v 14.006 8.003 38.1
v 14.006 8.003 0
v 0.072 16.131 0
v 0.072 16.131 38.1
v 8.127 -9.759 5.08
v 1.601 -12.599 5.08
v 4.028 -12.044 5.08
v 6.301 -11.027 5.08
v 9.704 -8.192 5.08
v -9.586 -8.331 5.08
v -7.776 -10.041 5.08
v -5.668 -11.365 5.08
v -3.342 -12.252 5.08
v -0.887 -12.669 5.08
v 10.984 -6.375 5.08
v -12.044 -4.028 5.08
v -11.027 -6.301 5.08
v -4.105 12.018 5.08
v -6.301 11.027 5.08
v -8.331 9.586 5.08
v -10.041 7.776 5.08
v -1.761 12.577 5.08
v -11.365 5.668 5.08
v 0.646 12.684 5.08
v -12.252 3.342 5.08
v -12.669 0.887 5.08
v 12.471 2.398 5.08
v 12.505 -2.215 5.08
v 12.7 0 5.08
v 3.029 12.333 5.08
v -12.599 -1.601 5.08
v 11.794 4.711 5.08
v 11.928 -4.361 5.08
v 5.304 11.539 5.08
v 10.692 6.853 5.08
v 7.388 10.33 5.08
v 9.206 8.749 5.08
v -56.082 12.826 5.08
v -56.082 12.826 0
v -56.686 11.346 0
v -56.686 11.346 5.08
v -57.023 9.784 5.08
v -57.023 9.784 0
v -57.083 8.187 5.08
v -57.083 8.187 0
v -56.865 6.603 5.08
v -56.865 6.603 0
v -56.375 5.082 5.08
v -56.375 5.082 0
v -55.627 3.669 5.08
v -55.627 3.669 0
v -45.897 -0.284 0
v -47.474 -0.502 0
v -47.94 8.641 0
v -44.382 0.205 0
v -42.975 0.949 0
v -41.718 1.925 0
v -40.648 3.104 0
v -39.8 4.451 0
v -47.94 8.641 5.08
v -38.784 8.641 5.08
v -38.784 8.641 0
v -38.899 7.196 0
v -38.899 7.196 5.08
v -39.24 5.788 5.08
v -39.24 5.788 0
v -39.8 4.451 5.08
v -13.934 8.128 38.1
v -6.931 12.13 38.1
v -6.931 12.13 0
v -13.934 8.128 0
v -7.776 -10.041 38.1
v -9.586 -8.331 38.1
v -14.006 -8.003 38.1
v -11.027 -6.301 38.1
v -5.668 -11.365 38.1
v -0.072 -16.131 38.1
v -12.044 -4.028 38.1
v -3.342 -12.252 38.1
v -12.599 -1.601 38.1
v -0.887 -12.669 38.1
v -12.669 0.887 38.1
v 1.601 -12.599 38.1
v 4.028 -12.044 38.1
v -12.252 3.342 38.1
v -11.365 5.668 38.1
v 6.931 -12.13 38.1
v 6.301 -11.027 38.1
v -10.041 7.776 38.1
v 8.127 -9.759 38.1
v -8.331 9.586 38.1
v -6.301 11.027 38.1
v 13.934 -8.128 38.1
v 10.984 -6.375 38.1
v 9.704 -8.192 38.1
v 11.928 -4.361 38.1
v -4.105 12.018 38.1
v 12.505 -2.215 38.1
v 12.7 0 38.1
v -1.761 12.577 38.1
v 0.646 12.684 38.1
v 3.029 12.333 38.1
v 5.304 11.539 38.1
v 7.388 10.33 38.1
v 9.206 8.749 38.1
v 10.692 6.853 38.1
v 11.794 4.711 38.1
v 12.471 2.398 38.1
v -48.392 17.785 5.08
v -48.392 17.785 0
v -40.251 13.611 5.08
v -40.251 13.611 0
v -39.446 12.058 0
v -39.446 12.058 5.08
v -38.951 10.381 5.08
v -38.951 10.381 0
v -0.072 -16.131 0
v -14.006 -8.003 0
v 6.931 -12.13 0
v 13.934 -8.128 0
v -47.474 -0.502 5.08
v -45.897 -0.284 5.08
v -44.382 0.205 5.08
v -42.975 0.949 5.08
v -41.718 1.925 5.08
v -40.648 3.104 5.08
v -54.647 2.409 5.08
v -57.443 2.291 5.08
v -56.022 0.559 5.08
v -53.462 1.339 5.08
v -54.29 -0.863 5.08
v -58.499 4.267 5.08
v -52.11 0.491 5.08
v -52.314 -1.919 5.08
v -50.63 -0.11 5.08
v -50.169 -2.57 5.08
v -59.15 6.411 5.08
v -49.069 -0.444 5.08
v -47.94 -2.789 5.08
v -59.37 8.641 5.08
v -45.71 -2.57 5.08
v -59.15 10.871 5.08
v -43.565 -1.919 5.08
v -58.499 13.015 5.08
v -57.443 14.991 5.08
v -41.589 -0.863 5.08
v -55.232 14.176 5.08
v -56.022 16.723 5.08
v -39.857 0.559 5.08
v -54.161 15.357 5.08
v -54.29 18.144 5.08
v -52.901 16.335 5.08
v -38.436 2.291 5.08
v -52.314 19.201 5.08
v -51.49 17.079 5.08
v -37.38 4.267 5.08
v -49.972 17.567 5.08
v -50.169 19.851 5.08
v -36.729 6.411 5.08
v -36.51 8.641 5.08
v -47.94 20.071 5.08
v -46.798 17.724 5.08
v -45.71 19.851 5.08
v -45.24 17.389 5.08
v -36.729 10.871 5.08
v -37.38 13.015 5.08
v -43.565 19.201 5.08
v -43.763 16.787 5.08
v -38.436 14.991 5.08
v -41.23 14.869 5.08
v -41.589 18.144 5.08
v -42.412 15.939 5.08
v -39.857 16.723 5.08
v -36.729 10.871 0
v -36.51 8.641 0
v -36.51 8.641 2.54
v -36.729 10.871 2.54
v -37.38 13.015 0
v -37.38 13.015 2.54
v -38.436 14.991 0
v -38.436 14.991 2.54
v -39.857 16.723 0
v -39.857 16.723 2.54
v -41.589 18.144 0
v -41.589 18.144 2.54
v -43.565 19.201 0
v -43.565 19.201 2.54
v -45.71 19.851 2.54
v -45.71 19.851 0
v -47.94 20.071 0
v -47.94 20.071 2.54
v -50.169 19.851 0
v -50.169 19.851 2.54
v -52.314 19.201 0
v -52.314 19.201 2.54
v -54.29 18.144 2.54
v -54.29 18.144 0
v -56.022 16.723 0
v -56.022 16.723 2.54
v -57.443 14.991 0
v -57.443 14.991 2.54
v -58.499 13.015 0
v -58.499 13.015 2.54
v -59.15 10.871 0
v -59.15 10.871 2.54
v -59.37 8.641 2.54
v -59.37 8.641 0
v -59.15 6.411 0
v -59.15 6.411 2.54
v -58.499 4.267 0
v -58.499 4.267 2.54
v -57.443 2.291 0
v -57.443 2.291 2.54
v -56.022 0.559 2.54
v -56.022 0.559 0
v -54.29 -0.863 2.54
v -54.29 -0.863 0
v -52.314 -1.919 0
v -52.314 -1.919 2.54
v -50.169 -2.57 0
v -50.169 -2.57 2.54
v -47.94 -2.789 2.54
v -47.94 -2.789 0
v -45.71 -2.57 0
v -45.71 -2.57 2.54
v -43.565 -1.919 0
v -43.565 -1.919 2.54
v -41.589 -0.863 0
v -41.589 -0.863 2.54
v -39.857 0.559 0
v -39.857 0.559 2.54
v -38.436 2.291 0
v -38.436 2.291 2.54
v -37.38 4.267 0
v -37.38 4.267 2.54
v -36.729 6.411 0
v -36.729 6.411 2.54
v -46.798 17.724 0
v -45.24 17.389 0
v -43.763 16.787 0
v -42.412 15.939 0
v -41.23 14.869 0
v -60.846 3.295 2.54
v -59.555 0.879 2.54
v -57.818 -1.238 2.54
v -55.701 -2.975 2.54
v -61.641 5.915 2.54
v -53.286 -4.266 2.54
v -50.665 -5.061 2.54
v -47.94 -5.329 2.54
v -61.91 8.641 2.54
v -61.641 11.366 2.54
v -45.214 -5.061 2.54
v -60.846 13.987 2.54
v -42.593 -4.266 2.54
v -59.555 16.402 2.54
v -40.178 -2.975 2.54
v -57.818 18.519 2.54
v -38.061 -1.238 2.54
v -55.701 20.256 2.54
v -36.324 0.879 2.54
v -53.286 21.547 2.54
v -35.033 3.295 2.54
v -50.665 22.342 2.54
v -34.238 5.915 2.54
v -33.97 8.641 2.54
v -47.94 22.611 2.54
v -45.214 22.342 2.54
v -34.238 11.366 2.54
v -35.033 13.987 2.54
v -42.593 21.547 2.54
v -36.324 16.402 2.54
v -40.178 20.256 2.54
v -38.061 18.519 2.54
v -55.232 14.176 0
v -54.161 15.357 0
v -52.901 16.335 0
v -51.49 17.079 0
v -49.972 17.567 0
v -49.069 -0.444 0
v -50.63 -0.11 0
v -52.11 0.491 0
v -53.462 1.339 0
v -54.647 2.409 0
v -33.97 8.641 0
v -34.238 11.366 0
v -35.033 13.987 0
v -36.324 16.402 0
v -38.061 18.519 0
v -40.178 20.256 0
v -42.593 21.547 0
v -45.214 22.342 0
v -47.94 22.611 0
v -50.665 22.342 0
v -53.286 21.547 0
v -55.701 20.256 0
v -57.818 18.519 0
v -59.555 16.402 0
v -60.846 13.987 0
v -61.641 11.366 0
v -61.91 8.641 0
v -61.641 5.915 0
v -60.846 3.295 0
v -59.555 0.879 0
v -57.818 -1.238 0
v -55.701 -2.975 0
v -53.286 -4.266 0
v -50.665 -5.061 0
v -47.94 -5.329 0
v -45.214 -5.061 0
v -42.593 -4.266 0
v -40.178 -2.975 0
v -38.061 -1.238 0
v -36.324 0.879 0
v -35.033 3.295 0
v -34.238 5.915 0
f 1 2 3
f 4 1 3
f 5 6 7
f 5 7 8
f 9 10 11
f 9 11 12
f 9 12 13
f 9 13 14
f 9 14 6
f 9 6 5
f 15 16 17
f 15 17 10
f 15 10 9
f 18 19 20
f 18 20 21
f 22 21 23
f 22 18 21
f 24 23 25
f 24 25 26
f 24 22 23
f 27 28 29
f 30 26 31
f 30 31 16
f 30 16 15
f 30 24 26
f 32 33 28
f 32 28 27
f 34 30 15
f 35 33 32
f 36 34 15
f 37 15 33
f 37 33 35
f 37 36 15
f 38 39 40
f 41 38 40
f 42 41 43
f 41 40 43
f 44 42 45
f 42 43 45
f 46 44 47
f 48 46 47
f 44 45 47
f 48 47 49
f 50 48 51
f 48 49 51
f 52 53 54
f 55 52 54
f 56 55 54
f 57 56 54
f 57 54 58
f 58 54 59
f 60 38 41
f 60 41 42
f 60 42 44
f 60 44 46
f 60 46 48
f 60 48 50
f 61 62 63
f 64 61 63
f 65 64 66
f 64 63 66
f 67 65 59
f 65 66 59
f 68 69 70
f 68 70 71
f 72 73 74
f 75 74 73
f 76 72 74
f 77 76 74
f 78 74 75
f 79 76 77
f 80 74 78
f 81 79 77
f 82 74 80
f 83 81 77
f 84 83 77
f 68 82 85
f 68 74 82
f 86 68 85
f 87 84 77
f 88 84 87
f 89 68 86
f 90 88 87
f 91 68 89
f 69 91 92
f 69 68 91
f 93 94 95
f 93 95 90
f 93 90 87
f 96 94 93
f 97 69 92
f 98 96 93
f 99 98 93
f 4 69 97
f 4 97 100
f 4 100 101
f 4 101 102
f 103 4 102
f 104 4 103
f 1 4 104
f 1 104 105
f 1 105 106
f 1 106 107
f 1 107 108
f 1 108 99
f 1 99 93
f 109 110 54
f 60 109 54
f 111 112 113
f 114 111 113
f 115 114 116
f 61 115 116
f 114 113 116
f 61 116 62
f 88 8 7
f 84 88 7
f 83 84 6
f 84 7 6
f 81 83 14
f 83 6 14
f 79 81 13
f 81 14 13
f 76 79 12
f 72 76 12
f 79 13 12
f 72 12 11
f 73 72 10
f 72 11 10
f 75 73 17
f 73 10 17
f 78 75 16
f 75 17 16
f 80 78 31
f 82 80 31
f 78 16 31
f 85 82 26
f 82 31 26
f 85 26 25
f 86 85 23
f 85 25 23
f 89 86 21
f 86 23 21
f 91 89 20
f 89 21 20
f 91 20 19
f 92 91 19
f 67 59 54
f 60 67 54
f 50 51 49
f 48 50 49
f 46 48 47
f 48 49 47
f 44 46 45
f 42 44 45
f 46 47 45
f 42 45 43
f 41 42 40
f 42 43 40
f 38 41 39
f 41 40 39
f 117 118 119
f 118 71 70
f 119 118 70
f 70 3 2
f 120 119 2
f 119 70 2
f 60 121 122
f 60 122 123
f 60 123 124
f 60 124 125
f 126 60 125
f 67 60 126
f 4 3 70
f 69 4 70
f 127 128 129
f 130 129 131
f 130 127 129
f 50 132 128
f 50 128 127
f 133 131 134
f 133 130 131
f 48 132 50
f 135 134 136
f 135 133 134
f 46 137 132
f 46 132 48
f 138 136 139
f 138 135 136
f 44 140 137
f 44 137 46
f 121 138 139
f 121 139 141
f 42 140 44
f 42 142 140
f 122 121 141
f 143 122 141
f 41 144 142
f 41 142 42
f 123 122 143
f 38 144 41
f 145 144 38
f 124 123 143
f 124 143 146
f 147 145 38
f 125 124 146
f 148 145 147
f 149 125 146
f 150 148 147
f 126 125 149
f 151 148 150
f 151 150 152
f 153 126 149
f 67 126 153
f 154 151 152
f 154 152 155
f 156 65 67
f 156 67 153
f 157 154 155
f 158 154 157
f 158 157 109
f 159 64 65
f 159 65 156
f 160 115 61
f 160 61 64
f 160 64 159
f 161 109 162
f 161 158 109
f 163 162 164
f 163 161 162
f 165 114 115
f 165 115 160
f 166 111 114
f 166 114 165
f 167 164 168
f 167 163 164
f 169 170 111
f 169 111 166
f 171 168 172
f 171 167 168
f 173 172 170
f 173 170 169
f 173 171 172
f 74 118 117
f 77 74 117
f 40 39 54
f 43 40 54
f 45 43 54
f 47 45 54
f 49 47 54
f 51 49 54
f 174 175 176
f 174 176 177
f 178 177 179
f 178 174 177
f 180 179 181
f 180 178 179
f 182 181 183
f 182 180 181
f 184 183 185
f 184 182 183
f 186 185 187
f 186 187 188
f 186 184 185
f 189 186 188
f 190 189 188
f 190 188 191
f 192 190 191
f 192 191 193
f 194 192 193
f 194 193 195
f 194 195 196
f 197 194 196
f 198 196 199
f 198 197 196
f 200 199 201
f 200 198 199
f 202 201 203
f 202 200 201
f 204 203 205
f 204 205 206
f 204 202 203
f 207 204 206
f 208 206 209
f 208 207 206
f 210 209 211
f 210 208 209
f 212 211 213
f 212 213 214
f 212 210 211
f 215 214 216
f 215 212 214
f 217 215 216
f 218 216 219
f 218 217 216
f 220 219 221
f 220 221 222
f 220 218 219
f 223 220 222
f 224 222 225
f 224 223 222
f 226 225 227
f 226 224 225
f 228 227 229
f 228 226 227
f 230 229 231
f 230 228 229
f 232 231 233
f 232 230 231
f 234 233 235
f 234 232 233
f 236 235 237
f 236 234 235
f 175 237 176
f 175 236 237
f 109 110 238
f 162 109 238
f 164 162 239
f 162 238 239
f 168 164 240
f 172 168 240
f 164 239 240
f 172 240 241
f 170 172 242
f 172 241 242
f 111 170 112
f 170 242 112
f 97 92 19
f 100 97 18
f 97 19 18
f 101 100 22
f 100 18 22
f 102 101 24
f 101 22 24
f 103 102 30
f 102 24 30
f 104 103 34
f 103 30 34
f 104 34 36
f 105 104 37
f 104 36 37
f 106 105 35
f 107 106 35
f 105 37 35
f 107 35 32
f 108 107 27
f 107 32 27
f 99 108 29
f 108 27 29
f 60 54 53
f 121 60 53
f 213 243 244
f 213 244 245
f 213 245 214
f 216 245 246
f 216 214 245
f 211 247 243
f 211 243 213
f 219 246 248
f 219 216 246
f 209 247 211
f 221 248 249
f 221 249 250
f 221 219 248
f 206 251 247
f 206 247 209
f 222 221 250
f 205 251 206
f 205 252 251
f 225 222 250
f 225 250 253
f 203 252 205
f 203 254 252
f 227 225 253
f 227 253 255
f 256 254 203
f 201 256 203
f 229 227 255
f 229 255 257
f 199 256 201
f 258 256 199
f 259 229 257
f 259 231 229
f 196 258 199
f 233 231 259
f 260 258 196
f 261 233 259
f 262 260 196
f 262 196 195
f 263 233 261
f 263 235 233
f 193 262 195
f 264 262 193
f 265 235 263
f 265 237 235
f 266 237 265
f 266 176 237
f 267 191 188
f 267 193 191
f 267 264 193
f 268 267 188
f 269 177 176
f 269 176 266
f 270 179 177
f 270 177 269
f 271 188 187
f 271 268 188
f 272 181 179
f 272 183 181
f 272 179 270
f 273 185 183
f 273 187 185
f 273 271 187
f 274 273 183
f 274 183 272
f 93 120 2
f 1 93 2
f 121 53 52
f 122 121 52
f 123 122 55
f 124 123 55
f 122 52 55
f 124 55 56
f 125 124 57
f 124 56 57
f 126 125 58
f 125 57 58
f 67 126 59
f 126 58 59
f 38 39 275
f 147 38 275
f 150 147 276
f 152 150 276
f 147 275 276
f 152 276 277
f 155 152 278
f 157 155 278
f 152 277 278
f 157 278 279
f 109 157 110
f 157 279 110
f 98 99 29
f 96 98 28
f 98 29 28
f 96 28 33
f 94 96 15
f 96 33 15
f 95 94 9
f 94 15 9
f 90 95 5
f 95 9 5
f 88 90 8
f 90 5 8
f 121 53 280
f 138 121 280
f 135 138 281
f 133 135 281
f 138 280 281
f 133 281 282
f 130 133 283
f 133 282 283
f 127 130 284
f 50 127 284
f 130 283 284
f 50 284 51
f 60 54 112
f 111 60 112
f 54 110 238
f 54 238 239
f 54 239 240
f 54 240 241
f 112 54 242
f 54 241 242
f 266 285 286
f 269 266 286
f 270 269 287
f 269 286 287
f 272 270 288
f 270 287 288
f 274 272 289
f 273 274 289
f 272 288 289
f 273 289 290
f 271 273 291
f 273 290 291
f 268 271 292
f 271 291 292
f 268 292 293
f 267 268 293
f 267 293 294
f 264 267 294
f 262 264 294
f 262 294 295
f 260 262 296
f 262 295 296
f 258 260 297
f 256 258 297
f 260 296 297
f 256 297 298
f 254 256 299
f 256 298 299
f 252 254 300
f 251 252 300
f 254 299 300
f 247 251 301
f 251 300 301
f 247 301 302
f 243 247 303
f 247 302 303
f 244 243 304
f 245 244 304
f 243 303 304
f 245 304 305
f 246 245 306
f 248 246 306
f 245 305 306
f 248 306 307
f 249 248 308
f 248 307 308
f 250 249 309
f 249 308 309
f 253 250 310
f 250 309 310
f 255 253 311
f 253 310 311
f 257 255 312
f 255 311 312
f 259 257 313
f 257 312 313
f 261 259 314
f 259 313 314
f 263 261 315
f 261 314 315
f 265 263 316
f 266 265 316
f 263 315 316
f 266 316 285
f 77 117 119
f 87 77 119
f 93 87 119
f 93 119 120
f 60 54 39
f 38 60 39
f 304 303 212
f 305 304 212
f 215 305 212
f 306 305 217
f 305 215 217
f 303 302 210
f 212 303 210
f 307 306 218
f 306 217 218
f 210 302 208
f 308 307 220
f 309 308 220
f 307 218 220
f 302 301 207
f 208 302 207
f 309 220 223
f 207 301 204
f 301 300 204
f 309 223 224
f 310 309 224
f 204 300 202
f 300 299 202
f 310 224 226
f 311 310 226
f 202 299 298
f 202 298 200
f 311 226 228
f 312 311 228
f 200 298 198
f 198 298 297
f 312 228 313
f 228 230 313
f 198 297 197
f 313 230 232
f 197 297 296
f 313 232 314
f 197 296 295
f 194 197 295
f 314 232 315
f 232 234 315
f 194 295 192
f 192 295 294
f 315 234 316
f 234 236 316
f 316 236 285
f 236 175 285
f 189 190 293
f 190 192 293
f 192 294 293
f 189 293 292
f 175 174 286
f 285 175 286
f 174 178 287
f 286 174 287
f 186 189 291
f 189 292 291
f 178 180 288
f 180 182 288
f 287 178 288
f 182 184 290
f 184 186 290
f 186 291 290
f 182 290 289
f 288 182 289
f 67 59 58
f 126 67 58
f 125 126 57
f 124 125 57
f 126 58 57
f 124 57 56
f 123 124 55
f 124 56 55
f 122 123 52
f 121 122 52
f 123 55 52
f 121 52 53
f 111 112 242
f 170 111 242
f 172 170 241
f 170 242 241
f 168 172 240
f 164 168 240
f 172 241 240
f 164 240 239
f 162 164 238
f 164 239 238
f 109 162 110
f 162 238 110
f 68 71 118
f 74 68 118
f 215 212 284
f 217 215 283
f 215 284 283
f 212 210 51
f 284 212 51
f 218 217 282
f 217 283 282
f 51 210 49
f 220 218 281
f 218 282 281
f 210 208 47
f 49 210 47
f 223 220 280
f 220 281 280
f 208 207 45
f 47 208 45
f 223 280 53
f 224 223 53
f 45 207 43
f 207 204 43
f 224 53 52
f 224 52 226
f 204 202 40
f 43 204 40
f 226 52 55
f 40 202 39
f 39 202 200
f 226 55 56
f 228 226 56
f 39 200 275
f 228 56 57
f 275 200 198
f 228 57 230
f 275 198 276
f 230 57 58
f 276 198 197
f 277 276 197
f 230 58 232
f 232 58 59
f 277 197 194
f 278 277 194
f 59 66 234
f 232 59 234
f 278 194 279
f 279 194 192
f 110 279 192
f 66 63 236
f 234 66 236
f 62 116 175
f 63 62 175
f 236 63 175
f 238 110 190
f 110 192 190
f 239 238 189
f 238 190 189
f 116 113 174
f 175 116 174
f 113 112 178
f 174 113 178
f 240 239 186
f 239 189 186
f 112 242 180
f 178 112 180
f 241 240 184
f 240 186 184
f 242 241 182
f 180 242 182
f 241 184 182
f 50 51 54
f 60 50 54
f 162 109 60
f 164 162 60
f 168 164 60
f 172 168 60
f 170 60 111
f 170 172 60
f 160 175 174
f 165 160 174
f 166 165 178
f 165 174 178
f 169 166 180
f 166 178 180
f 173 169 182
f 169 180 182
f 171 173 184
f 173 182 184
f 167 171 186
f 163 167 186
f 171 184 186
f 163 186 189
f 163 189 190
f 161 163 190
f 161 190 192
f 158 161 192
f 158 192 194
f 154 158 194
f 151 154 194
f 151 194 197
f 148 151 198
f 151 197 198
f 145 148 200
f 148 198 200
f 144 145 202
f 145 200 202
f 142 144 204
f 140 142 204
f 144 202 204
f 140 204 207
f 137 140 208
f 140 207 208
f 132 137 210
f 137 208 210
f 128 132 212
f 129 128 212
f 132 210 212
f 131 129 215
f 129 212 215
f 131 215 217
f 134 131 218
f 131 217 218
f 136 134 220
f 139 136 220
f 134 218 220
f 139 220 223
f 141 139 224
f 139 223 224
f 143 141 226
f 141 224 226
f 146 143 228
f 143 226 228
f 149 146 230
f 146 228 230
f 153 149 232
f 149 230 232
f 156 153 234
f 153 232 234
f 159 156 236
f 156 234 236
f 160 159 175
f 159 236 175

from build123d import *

# Parameters (mm, degrees)
F1_DEPTH = 38.1
F2_DEPTH = 5.08
F3_R     = 13.97
F3_R_2   = 11.43
F4_DEPTH = 2.54
F5_DEPTH = 5.08
F6_DEPTH = 5.08


with BuildPart() as f1:
    # F0 (on Top) → F1 (new body)
    with BuildSketch(Plane.XY):
        with BuildLine():
            Line((14.0059588347, 8.0029775992), (0.0721975106, 16.1310049548))
            Line((0.0721975106, 16.1310049548), (-6.9307819068, 12.1295161552))
            Line((-6.9307819068, 12.1295161552), (-6.3007108244, 11.0268328684))
            ThreePointArc((-6.3007108244, 11.0268328684), (6.3745969492, 10.9842848531), (12.7, 0))
            ThreePointArc((12.7, 0), (10.9842848531, -6.3745969492), (6.3007108244, -11.0268328684))
            Line((6.3007108244, -11.0268328684), (6.9307819068, -12.1295161552))
            Line((6.9307819068, -12.1295161552), (13.9337613242, -8.1280273557))
            Line((13.9337613242, -8.1280273557), (14.0059588347, 8.0029775992))
        make_face()
        with BuildLine():
            Line((-6.3007108244, 11.0268328684), (-6.9307819068, 12.1295161552))
            Line((-6.9307819068, 12.1295161552), (-13.9337613242, 8.1280273557))
            Line((-13.9337613242, 8.1280273557), (-14.0059588347, -8.0029775992))
            Line((-14.0059588347, -8.0029775992), (-0.0721975106, -16.1310049548))
            Line((-0.0721975106, -16.1310049548), (6.9307819068, -12.1295161552))
            Line((6.9307819068, -12.1295161552), (6.3007108244, -11.0268328684))
            ThreePointArc((6.3007108244, -11.0268328684), (-11.0268328684, -6.3007108244), (-6.3007108244, 11.0268328684))
        make_face()
    extrude(amount=F1_DEPTH)

    # F0 (on Top) → F2 (join)
    with BuildSketch(Plane.XY):
        with BuildLine():
            Line((6.3007108244, -11.0268328684), (-6.3007108244, 11.0268328684))
            ThreePointArc((-6.3007108244, 11.0268328684), (-11.0268328684, -6.3007108244), (6.3007108244, -11.0268328684))
        make_face()
        with BuildLine():
            ThreePointArc((12.7, 0), (6.3745969492, 10.9842848531), (-6.3007108244, 11.0268328684))
            Line((-6.3007108244, 11.0268328684), (6.3007108244, -11.0268328684))
            ThreePointArc((6.3007108244, -11.0268328684), (10.9842848531, -6.3745969492), (12.7, 0))
        make_face()
    extrude(amount=F2_DEPTH)


with BuildPart() as f4:
    # F3 (on Top) → F4 (new body)
    with BuildSketch(Plane.XY):
        with Locations((-47.9395352304, 8.6407475173)):
            Circle(F3_R)
        with Locations((-47.9395352304, 8.6407475173)):
            Circle(F3_R_2, mode=Mode.SUBTRACT)
    extrude(amount=F4_DEPTH)


with BuildPart() as f5:
    # F3 (on Top) → F5 (new body)
    with BuildSketch(Plane.XY):
        with BuildLine():
            Line((-47.9395352304, 8.6407475173), (-40.2509147157, 13.6106630009))
            ThreePointArc((-40.2509147157, 13.6106630009), (-43.7626192637, 16.787422811), (-48.3918169685, 17.7846190476))
            Line((-48.3918169685, 17.7846190476), (-47.9395352304, 8.6407475173))
        make_face()
    extrude(amount=F5_DEPTH)


with BuildPart() as f5b:
    # F3 (on Top) → F5, piece 2 (new body)
    with BuildSketch(Plane.XY):
        with BuildLine():
            Line((-55.6271489037, 3.6692747635), (-47.9395352304, 8.6407475173))
            Line((-47.9395352304, 8.6407475173), (-56.0819591317, 12.8259450449))
            ThreePointArc((-56.0819591317, 12.8259450449), (-57.083313173, 8.1865776496), (-55.6271489037, 3.6692747635))
        make_face()
    extrude(amount=F5_DEPTH)


with BuildPart() as f5c:
    # F3 (on Top) → F5, piece 3 (new body)
    with BuildSketch(Plane.XY):
        with BuildLine():
            ThreePointArc((-47.4739826156, -0.5024579433), (-42.9749911912, 0.9486575663), (-39.7996417205, 4.4506306955))
            Line((-39.7996417205, 4.4506306955), (-47.9395352304, 8.6407475173))
            Line((-47.9395352304, 8.6407475173), (-47.4739826156, -0.5024579433))
        make_face()
    extrude(amount=F5_DEPTH)


with BuildPart() as f6:
    # F3 (on Top) → F6 (new body)
    with BuildSketch(Plane.XY):
        with Locations((-47.9395352304, 8.6407475173)):
            Circle(F3_R_2)
        with BuildLine():
            ThreePointArc((-40.2509147157, 13.6106630009), (-39.1587421966, 11.2316197702), (-38.7844849666, 8.6407475173))
            ThreePointArc((-38.7844849666, 8.6407475173), (-39.0418928585, 6.485079279), (-39.7996417205, 4.4506306955))
            ThreePointArc((-39.7996417205, 4.4506306955), (-42.9749911912, 0.9486575663), (-47.4739826156, -0.5024579433))
            ThreePointArc((-47.4739826156, -0.5024579433), (-52.109712676, 0.4906208064), (-55.6271489037, 3.6692747635))
            ThreePointArc((-55.6271489037, 3.6692747635), (-57.083313173, 8.1865776496), (-56.0819591317, 12.8259450449))
            ThreePointArc((-56.0819591317, 12.8259450449), (-52.900820671, 16.3349396198), (-48.3918169685, 17.7846190476))
            ThreePointArc((-48.3918169685, 17.7846190476), (-43.7626192637, 16.787422811), (-40.2509147157, 13.6106630009))
        make_face(mode=Mode.SUBTRACT)
    extrude(amount=F6_DEPTH)


solid = Compound([f1.part, f4.part, f5.part, f5b.part, f5c.part, f6.part])
